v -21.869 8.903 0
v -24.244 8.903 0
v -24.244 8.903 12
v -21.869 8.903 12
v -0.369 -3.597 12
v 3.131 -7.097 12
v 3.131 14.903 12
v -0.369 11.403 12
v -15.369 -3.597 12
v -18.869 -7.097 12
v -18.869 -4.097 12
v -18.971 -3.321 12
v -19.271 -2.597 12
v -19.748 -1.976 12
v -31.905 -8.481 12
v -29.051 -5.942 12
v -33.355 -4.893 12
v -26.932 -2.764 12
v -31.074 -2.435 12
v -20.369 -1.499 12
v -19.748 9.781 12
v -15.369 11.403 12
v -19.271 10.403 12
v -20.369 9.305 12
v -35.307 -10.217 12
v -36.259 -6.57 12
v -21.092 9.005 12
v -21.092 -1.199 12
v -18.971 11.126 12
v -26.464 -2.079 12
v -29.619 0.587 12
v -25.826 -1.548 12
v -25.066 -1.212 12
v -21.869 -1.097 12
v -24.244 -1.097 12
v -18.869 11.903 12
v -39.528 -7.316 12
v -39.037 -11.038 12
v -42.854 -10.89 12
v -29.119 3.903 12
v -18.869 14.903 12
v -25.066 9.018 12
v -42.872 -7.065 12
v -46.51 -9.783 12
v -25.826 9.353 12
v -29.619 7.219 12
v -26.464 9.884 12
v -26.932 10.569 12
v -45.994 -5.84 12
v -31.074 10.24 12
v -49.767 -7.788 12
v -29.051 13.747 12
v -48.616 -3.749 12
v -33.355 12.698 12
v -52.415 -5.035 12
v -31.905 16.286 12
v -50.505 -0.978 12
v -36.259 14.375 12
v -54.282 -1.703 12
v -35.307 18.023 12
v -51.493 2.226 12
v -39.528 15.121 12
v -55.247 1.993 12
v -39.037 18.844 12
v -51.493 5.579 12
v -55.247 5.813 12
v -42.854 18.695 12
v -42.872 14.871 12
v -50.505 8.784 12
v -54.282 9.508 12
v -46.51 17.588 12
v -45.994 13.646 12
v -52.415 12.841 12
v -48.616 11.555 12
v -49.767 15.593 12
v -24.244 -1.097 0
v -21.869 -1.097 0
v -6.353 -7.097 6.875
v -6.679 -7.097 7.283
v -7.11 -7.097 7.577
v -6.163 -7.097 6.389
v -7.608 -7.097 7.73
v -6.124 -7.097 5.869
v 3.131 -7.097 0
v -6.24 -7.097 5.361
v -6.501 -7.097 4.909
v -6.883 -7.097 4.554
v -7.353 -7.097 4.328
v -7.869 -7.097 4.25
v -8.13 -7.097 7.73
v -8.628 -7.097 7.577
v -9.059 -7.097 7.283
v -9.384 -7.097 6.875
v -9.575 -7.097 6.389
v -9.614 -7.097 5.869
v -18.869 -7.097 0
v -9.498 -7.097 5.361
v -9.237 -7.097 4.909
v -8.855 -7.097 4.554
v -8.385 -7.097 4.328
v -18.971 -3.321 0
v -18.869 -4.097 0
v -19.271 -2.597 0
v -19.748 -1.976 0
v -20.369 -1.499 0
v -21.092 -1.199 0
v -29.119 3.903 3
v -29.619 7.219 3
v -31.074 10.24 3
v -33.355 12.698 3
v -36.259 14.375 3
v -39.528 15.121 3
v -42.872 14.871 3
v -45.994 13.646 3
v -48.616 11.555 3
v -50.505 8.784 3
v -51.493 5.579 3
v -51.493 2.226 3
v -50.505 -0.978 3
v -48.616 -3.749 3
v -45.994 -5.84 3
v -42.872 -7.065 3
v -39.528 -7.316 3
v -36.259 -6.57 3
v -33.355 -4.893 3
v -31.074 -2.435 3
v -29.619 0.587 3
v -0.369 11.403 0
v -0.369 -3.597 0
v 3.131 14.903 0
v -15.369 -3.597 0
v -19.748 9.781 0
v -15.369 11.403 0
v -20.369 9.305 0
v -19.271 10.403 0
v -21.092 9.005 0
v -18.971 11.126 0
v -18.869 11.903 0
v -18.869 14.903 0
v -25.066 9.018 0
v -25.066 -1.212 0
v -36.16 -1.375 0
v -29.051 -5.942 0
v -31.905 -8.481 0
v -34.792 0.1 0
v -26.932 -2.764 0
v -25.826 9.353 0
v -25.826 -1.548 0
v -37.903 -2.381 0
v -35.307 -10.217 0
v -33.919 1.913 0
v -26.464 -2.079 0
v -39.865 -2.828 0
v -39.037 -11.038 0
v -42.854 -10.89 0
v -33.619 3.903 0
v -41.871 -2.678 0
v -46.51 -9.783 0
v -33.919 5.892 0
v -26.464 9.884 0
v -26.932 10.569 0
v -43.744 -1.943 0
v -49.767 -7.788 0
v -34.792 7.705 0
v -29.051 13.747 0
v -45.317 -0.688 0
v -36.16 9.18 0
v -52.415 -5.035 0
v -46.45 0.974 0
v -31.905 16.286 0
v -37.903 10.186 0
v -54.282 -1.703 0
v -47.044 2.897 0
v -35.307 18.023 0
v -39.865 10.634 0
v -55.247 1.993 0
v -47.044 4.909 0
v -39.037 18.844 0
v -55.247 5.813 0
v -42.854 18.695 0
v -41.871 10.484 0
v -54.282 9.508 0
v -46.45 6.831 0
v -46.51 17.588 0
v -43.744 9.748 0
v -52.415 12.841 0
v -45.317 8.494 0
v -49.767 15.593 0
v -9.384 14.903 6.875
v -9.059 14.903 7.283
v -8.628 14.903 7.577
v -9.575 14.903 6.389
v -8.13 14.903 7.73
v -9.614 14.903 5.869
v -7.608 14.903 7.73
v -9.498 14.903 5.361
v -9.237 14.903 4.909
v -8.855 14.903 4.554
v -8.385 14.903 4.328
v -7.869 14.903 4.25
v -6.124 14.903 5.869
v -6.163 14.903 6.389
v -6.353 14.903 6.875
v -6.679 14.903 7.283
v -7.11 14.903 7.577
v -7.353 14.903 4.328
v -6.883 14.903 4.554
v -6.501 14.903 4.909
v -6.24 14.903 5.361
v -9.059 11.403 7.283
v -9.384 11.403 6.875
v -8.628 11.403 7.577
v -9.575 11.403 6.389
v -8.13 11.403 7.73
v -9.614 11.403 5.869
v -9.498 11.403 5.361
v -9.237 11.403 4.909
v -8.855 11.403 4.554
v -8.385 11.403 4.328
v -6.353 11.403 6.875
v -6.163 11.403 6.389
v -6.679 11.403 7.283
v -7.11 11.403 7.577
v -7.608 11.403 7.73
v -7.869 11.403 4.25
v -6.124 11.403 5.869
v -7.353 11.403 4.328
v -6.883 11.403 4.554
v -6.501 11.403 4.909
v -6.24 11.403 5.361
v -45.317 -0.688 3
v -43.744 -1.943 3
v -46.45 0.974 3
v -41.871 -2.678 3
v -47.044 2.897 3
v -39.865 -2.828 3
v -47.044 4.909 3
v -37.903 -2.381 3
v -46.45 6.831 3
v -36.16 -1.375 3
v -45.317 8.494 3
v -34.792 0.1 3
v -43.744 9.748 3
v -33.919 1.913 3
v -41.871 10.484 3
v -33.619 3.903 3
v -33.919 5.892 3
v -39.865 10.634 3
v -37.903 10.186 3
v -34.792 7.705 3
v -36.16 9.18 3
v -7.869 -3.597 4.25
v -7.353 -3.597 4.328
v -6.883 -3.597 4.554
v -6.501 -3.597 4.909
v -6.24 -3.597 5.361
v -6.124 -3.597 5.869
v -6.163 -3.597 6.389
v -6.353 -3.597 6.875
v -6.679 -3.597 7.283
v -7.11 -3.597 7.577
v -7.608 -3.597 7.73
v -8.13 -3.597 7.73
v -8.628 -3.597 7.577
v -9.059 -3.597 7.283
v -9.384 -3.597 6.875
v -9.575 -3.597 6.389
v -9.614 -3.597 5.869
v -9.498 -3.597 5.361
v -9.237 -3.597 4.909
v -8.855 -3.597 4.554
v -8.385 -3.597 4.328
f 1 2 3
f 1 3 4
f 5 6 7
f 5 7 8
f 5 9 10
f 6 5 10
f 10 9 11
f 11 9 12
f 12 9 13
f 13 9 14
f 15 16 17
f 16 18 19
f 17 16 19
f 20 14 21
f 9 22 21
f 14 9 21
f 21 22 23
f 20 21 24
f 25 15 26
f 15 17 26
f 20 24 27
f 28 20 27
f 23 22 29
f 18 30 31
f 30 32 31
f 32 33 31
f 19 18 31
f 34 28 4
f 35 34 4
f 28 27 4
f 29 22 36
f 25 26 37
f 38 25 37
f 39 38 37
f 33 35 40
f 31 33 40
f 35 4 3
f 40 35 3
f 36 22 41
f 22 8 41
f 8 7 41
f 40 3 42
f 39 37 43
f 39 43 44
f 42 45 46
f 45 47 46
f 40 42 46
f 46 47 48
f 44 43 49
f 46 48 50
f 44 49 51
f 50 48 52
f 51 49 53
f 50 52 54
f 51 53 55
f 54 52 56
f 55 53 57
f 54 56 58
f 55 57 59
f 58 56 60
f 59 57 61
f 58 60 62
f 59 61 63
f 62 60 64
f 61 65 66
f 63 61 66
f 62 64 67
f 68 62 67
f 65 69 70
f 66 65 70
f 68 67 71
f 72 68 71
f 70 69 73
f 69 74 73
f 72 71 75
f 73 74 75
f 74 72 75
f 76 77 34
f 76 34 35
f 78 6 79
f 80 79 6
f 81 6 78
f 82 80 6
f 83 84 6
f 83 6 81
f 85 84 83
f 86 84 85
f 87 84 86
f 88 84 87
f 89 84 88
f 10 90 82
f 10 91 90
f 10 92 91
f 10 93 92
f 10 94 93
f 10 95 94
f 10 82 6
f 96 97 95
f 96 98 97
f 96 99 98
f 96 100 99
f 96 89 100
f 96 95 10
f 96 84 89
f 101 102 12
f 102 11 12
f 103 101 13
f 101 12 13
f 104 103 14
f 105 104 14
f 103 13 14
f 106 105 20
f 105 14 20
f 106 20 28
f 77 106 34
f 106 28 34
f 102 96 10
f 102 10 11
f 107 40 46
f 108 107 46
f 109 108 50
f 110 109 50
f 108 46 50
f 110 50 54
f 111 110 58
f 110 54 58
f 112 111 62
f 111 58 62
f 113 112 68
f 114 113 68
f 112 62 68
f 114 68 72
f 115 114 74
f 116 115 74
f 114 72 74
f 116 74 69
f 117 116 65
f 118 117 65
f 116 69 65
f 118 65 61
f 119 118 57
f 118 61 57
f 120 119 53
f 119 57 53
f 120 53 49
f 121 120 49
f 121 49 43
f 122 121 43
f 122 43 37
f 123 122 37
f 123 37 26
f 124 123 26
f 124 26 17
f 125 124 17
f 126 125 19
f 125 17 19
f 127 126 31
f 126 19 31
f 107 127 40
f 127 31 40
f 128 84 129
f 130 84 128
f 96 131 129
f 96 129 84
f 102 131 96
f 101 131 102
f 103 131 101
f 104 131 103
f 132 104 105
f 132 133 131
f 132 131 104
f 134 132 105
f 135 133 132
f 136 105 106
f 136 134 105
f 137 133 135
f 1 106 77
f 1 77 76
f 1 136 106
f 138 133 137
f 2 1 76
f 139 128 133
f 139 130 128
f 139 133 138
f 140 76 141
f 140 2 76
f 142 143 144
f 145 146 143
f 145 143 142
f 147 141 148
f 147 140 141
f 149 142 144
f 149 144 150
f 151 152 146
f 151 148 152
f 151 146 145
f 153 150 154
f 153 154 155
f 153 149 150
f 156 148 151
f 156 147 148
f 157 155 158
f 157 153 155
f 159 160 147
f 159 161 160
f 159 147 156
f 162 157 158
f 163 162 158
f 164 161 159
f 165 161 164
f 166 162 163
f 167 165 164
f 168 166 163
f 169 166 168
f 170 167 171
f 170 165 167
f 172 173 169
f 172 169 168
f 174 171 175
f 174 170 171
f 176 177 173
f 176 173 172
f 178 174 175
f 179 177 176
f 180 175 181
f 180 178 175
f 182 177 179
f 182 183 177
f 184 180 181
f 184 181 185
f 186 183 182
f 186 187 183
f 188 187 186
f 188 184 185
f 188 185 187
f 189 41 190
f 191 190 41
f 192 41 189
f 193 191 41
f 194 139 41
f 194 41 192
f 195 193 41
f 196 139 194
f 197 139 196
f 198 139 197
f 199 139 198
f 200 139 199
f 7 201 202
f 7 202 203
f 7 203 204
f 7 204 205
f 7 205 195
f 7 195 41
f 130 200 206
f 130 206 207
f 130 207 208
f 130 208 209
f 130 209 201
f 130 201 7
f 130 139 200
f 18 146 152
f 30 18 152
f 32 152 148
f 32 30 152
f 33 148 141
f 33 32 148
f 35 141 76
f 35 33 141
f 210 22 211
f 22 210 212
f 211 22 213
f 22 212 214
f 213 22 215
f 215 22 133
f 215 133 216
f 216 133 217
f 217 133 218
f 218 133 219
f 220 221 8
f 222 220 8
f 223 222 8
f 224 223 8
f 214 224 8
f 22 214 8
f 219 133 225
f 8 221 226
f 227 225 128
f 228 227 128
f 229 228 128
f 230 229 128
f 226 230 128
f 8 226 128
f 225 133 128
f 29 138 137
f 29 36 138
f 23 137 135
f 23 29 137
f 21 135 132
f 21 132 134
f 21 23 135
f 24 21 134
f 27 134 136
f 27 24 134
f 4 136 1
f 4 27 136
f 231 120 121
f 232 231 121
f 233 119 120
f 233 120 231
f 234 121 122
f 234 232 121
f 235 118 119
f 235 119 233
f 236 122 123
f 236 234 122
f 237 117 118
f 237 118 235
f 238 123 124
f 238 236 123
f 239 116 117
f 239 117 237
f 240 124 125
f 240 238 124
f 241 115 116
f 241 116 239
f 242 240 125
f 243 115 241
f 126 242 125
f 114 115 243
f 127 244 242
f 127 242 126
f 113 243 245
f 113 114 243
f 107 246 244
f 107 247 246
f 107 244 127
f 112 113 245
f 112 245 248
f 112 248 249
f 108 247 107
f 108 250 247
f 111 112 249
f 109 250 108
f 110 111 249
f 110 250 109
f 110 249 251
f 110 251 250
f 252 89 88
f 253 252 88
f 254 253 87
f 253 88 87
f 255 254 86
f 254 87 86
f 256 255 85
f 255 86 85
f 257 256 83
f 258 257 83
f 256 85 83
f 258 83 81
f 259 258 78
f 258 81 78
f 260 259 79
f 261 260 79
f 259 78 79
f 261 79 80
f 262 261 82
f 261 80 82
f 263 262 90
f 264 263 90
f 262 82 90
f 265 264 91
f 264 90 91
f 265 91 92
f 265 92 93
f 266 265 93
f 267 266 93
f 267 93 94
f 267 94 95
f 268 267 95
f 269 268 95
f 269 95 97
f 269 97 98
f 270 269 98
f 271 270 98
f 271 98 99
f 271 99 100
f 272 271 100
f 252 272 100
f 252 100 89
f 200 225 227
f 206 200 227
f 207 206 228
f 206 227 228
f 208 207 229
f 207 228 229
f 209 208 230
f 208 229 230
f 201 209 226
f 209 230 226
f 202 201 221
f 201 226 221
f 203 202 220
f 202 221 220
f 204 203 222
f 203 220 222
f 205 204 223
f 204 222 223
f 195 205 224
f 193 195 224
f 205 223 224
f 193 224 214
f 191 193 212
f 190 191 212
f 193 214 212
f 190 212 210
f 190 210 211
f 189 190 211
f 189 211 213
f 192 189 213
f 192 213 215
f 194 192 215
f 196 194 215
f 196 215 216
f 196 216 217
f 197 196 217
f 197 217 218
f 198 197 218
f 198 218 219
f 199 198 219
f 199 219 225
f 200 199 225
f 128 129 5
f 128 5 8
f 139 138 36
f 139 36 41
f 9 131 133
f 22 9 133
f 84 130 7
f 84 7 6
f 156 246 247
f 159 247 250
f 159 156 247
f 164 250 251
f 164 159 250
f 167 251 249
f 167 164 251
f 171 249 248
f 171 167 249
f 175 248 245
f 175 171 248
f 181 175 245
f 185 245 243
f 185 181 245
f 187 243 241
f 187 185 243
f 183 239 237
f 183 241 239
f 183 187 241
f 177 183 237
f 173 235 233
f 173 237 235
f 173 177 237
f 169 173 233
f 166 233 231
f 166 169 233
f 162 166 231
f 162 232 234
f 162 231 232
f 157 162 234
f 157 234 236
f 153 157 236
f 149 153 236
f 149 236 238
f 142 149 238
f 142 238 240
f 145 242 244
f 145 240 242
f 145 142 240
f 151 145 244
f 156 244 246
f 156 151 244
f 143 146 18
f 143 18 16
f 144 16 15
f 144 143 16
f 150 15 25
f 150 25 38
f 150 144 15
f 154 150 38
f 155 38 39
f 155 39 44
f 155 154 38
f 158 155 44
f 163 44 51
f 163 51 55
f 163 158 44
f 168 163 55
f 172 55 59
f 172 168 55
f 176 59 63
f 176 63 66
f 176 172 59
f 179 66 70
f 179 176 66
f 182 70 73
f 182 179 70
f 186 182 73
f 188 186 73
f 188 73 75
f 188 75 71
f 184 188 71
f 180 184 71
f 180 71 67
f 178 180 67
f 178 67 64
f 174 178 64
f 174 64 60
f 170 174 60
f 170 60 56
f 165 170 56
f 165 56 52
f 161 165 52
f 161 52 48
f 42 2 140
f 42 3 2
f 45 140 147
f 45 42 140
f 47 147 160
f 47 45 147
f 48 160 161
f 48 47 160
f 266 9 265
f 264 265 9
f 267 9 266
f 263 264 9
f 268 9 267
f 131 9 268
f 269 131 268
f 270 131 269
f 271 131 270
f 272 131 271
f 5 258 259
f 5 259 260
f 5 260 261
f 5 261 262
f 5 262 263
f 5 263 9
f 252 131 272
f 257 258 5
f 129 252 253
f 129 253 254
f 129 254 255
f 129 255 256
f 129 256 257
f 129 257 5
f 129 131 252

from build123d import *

# Parameters (mm, degrees)
SKETCH1_R           = 6.75
SKETCH1_W           = 15
SKETCH1_H           = 15
BOSS_EXTRUDE1_DEPTH = 12
CUT_EXTRUDE1_REACH  = 64.336
SKETCH2_R           = 1.75
FILLET1_R           = 3
SKETCH3_R           = 11.25
CUT_EXTRUDE2_DEPTH  = 9


with BuildPart() as part:
    # Sketch1 → Boss-Extrude1 (new body)
    with BuildSketch(Plane.XY):
        with BuildLine():
            Line((-18.868931919, 14.90275594), (3.131068081, 14.90275594))
            Line((3.131068081, 14.90275594), (3.131068081, -7.09724406))
            Line((3.131068081, -7.09724406), (-18.868931919, -7.09724406))
            Line((-18.868931919, -7.09724406), (-18.868931919, -1.09724406))
            Line((-18.868931919, -1.09724406), (-26.226796295, -1.09724406))
            ThreePointArc((-26.226796295, -1.09724406), (-55.368931919, 3.90275594), (-26.226796295, 8.90275594))
            Line((-26.226796295, 8.90275594), (-18.868931919, 8.90275594))
            Line((-18.868931919, 8.90275594), (-18.868931919, 14.90275594))
        make_face()
        with Locations((-40.368931919, 3.90275594)):
            Circle(SKETCH1_R, mode=Mode.SUBTRACT)
        with Locations((-7.868931919, 3.90275594)):
            Rectangle(SKETCH1_W, SKETCH1_H, mode=Mode.SUBTRACT)
    extrude(amount=BOSS_EXTRUDE1_DEPTH)

    # Cut-Extrude1: up to this face of the body (flat: up to its plane)
    cut_extrude1_end = Plane(part.part.faces().sort_by_distance((-7.868931919, 14.90275594, 6))[0])
    # Sketch2 → Cut-Extrude1 (cut, up to the picked face)
    with BuildSketch(Plane.XZ.offset(7.09724406), mode=Mode.PRIVATE) as cut_extrude1_sk1:
        with Locations(Location((-7.868931919, 6, 0), (0, 0, 270))):
            Circle(SKETCH2_R)
    cut_extrude1_tool1 = split(extrude(cut_extrude1_sk1.sketch, amount=-CUT_EXTRUDE1_REACH, mode=Mode.PRIVATE), bisect_by=cut_extrude1_end, keep=Keep.BOTH, mode=Mode.PRIVATE)
    add(cut_extrude1_tool1.solids().sort_by(Axis((-7.868932, -7.097244, 6), (0, 1, 0)))[0], mode=Mode.SUBTRACT)

    # Fillet1
    fillet1_edges = [part.edges().sort_by_distance(p)[0] for p in [
        (-18.868931919, -1.09724406, 6),
        (-26.226796295, -1.09724406, 6),
        (-26.226796295, 8.90275594, 6),
        (-18.868931919, 8.90275594, 6),
    ]]
    fillet(fillet1_edges, radius=FILLET1_R)

    # Sketch3 → Cut-Extrude2 (cut)
    with BuildSketch(Plane.XY.offset(12)):
        with Locations((-40.368931919, 3.90275594)):
            Circle(SKETCH3_R)
    extrude(amount=-CUT_EXTRUDE2_DEPTH, mode=Mode.SUBTRACT)


solid = part.part
